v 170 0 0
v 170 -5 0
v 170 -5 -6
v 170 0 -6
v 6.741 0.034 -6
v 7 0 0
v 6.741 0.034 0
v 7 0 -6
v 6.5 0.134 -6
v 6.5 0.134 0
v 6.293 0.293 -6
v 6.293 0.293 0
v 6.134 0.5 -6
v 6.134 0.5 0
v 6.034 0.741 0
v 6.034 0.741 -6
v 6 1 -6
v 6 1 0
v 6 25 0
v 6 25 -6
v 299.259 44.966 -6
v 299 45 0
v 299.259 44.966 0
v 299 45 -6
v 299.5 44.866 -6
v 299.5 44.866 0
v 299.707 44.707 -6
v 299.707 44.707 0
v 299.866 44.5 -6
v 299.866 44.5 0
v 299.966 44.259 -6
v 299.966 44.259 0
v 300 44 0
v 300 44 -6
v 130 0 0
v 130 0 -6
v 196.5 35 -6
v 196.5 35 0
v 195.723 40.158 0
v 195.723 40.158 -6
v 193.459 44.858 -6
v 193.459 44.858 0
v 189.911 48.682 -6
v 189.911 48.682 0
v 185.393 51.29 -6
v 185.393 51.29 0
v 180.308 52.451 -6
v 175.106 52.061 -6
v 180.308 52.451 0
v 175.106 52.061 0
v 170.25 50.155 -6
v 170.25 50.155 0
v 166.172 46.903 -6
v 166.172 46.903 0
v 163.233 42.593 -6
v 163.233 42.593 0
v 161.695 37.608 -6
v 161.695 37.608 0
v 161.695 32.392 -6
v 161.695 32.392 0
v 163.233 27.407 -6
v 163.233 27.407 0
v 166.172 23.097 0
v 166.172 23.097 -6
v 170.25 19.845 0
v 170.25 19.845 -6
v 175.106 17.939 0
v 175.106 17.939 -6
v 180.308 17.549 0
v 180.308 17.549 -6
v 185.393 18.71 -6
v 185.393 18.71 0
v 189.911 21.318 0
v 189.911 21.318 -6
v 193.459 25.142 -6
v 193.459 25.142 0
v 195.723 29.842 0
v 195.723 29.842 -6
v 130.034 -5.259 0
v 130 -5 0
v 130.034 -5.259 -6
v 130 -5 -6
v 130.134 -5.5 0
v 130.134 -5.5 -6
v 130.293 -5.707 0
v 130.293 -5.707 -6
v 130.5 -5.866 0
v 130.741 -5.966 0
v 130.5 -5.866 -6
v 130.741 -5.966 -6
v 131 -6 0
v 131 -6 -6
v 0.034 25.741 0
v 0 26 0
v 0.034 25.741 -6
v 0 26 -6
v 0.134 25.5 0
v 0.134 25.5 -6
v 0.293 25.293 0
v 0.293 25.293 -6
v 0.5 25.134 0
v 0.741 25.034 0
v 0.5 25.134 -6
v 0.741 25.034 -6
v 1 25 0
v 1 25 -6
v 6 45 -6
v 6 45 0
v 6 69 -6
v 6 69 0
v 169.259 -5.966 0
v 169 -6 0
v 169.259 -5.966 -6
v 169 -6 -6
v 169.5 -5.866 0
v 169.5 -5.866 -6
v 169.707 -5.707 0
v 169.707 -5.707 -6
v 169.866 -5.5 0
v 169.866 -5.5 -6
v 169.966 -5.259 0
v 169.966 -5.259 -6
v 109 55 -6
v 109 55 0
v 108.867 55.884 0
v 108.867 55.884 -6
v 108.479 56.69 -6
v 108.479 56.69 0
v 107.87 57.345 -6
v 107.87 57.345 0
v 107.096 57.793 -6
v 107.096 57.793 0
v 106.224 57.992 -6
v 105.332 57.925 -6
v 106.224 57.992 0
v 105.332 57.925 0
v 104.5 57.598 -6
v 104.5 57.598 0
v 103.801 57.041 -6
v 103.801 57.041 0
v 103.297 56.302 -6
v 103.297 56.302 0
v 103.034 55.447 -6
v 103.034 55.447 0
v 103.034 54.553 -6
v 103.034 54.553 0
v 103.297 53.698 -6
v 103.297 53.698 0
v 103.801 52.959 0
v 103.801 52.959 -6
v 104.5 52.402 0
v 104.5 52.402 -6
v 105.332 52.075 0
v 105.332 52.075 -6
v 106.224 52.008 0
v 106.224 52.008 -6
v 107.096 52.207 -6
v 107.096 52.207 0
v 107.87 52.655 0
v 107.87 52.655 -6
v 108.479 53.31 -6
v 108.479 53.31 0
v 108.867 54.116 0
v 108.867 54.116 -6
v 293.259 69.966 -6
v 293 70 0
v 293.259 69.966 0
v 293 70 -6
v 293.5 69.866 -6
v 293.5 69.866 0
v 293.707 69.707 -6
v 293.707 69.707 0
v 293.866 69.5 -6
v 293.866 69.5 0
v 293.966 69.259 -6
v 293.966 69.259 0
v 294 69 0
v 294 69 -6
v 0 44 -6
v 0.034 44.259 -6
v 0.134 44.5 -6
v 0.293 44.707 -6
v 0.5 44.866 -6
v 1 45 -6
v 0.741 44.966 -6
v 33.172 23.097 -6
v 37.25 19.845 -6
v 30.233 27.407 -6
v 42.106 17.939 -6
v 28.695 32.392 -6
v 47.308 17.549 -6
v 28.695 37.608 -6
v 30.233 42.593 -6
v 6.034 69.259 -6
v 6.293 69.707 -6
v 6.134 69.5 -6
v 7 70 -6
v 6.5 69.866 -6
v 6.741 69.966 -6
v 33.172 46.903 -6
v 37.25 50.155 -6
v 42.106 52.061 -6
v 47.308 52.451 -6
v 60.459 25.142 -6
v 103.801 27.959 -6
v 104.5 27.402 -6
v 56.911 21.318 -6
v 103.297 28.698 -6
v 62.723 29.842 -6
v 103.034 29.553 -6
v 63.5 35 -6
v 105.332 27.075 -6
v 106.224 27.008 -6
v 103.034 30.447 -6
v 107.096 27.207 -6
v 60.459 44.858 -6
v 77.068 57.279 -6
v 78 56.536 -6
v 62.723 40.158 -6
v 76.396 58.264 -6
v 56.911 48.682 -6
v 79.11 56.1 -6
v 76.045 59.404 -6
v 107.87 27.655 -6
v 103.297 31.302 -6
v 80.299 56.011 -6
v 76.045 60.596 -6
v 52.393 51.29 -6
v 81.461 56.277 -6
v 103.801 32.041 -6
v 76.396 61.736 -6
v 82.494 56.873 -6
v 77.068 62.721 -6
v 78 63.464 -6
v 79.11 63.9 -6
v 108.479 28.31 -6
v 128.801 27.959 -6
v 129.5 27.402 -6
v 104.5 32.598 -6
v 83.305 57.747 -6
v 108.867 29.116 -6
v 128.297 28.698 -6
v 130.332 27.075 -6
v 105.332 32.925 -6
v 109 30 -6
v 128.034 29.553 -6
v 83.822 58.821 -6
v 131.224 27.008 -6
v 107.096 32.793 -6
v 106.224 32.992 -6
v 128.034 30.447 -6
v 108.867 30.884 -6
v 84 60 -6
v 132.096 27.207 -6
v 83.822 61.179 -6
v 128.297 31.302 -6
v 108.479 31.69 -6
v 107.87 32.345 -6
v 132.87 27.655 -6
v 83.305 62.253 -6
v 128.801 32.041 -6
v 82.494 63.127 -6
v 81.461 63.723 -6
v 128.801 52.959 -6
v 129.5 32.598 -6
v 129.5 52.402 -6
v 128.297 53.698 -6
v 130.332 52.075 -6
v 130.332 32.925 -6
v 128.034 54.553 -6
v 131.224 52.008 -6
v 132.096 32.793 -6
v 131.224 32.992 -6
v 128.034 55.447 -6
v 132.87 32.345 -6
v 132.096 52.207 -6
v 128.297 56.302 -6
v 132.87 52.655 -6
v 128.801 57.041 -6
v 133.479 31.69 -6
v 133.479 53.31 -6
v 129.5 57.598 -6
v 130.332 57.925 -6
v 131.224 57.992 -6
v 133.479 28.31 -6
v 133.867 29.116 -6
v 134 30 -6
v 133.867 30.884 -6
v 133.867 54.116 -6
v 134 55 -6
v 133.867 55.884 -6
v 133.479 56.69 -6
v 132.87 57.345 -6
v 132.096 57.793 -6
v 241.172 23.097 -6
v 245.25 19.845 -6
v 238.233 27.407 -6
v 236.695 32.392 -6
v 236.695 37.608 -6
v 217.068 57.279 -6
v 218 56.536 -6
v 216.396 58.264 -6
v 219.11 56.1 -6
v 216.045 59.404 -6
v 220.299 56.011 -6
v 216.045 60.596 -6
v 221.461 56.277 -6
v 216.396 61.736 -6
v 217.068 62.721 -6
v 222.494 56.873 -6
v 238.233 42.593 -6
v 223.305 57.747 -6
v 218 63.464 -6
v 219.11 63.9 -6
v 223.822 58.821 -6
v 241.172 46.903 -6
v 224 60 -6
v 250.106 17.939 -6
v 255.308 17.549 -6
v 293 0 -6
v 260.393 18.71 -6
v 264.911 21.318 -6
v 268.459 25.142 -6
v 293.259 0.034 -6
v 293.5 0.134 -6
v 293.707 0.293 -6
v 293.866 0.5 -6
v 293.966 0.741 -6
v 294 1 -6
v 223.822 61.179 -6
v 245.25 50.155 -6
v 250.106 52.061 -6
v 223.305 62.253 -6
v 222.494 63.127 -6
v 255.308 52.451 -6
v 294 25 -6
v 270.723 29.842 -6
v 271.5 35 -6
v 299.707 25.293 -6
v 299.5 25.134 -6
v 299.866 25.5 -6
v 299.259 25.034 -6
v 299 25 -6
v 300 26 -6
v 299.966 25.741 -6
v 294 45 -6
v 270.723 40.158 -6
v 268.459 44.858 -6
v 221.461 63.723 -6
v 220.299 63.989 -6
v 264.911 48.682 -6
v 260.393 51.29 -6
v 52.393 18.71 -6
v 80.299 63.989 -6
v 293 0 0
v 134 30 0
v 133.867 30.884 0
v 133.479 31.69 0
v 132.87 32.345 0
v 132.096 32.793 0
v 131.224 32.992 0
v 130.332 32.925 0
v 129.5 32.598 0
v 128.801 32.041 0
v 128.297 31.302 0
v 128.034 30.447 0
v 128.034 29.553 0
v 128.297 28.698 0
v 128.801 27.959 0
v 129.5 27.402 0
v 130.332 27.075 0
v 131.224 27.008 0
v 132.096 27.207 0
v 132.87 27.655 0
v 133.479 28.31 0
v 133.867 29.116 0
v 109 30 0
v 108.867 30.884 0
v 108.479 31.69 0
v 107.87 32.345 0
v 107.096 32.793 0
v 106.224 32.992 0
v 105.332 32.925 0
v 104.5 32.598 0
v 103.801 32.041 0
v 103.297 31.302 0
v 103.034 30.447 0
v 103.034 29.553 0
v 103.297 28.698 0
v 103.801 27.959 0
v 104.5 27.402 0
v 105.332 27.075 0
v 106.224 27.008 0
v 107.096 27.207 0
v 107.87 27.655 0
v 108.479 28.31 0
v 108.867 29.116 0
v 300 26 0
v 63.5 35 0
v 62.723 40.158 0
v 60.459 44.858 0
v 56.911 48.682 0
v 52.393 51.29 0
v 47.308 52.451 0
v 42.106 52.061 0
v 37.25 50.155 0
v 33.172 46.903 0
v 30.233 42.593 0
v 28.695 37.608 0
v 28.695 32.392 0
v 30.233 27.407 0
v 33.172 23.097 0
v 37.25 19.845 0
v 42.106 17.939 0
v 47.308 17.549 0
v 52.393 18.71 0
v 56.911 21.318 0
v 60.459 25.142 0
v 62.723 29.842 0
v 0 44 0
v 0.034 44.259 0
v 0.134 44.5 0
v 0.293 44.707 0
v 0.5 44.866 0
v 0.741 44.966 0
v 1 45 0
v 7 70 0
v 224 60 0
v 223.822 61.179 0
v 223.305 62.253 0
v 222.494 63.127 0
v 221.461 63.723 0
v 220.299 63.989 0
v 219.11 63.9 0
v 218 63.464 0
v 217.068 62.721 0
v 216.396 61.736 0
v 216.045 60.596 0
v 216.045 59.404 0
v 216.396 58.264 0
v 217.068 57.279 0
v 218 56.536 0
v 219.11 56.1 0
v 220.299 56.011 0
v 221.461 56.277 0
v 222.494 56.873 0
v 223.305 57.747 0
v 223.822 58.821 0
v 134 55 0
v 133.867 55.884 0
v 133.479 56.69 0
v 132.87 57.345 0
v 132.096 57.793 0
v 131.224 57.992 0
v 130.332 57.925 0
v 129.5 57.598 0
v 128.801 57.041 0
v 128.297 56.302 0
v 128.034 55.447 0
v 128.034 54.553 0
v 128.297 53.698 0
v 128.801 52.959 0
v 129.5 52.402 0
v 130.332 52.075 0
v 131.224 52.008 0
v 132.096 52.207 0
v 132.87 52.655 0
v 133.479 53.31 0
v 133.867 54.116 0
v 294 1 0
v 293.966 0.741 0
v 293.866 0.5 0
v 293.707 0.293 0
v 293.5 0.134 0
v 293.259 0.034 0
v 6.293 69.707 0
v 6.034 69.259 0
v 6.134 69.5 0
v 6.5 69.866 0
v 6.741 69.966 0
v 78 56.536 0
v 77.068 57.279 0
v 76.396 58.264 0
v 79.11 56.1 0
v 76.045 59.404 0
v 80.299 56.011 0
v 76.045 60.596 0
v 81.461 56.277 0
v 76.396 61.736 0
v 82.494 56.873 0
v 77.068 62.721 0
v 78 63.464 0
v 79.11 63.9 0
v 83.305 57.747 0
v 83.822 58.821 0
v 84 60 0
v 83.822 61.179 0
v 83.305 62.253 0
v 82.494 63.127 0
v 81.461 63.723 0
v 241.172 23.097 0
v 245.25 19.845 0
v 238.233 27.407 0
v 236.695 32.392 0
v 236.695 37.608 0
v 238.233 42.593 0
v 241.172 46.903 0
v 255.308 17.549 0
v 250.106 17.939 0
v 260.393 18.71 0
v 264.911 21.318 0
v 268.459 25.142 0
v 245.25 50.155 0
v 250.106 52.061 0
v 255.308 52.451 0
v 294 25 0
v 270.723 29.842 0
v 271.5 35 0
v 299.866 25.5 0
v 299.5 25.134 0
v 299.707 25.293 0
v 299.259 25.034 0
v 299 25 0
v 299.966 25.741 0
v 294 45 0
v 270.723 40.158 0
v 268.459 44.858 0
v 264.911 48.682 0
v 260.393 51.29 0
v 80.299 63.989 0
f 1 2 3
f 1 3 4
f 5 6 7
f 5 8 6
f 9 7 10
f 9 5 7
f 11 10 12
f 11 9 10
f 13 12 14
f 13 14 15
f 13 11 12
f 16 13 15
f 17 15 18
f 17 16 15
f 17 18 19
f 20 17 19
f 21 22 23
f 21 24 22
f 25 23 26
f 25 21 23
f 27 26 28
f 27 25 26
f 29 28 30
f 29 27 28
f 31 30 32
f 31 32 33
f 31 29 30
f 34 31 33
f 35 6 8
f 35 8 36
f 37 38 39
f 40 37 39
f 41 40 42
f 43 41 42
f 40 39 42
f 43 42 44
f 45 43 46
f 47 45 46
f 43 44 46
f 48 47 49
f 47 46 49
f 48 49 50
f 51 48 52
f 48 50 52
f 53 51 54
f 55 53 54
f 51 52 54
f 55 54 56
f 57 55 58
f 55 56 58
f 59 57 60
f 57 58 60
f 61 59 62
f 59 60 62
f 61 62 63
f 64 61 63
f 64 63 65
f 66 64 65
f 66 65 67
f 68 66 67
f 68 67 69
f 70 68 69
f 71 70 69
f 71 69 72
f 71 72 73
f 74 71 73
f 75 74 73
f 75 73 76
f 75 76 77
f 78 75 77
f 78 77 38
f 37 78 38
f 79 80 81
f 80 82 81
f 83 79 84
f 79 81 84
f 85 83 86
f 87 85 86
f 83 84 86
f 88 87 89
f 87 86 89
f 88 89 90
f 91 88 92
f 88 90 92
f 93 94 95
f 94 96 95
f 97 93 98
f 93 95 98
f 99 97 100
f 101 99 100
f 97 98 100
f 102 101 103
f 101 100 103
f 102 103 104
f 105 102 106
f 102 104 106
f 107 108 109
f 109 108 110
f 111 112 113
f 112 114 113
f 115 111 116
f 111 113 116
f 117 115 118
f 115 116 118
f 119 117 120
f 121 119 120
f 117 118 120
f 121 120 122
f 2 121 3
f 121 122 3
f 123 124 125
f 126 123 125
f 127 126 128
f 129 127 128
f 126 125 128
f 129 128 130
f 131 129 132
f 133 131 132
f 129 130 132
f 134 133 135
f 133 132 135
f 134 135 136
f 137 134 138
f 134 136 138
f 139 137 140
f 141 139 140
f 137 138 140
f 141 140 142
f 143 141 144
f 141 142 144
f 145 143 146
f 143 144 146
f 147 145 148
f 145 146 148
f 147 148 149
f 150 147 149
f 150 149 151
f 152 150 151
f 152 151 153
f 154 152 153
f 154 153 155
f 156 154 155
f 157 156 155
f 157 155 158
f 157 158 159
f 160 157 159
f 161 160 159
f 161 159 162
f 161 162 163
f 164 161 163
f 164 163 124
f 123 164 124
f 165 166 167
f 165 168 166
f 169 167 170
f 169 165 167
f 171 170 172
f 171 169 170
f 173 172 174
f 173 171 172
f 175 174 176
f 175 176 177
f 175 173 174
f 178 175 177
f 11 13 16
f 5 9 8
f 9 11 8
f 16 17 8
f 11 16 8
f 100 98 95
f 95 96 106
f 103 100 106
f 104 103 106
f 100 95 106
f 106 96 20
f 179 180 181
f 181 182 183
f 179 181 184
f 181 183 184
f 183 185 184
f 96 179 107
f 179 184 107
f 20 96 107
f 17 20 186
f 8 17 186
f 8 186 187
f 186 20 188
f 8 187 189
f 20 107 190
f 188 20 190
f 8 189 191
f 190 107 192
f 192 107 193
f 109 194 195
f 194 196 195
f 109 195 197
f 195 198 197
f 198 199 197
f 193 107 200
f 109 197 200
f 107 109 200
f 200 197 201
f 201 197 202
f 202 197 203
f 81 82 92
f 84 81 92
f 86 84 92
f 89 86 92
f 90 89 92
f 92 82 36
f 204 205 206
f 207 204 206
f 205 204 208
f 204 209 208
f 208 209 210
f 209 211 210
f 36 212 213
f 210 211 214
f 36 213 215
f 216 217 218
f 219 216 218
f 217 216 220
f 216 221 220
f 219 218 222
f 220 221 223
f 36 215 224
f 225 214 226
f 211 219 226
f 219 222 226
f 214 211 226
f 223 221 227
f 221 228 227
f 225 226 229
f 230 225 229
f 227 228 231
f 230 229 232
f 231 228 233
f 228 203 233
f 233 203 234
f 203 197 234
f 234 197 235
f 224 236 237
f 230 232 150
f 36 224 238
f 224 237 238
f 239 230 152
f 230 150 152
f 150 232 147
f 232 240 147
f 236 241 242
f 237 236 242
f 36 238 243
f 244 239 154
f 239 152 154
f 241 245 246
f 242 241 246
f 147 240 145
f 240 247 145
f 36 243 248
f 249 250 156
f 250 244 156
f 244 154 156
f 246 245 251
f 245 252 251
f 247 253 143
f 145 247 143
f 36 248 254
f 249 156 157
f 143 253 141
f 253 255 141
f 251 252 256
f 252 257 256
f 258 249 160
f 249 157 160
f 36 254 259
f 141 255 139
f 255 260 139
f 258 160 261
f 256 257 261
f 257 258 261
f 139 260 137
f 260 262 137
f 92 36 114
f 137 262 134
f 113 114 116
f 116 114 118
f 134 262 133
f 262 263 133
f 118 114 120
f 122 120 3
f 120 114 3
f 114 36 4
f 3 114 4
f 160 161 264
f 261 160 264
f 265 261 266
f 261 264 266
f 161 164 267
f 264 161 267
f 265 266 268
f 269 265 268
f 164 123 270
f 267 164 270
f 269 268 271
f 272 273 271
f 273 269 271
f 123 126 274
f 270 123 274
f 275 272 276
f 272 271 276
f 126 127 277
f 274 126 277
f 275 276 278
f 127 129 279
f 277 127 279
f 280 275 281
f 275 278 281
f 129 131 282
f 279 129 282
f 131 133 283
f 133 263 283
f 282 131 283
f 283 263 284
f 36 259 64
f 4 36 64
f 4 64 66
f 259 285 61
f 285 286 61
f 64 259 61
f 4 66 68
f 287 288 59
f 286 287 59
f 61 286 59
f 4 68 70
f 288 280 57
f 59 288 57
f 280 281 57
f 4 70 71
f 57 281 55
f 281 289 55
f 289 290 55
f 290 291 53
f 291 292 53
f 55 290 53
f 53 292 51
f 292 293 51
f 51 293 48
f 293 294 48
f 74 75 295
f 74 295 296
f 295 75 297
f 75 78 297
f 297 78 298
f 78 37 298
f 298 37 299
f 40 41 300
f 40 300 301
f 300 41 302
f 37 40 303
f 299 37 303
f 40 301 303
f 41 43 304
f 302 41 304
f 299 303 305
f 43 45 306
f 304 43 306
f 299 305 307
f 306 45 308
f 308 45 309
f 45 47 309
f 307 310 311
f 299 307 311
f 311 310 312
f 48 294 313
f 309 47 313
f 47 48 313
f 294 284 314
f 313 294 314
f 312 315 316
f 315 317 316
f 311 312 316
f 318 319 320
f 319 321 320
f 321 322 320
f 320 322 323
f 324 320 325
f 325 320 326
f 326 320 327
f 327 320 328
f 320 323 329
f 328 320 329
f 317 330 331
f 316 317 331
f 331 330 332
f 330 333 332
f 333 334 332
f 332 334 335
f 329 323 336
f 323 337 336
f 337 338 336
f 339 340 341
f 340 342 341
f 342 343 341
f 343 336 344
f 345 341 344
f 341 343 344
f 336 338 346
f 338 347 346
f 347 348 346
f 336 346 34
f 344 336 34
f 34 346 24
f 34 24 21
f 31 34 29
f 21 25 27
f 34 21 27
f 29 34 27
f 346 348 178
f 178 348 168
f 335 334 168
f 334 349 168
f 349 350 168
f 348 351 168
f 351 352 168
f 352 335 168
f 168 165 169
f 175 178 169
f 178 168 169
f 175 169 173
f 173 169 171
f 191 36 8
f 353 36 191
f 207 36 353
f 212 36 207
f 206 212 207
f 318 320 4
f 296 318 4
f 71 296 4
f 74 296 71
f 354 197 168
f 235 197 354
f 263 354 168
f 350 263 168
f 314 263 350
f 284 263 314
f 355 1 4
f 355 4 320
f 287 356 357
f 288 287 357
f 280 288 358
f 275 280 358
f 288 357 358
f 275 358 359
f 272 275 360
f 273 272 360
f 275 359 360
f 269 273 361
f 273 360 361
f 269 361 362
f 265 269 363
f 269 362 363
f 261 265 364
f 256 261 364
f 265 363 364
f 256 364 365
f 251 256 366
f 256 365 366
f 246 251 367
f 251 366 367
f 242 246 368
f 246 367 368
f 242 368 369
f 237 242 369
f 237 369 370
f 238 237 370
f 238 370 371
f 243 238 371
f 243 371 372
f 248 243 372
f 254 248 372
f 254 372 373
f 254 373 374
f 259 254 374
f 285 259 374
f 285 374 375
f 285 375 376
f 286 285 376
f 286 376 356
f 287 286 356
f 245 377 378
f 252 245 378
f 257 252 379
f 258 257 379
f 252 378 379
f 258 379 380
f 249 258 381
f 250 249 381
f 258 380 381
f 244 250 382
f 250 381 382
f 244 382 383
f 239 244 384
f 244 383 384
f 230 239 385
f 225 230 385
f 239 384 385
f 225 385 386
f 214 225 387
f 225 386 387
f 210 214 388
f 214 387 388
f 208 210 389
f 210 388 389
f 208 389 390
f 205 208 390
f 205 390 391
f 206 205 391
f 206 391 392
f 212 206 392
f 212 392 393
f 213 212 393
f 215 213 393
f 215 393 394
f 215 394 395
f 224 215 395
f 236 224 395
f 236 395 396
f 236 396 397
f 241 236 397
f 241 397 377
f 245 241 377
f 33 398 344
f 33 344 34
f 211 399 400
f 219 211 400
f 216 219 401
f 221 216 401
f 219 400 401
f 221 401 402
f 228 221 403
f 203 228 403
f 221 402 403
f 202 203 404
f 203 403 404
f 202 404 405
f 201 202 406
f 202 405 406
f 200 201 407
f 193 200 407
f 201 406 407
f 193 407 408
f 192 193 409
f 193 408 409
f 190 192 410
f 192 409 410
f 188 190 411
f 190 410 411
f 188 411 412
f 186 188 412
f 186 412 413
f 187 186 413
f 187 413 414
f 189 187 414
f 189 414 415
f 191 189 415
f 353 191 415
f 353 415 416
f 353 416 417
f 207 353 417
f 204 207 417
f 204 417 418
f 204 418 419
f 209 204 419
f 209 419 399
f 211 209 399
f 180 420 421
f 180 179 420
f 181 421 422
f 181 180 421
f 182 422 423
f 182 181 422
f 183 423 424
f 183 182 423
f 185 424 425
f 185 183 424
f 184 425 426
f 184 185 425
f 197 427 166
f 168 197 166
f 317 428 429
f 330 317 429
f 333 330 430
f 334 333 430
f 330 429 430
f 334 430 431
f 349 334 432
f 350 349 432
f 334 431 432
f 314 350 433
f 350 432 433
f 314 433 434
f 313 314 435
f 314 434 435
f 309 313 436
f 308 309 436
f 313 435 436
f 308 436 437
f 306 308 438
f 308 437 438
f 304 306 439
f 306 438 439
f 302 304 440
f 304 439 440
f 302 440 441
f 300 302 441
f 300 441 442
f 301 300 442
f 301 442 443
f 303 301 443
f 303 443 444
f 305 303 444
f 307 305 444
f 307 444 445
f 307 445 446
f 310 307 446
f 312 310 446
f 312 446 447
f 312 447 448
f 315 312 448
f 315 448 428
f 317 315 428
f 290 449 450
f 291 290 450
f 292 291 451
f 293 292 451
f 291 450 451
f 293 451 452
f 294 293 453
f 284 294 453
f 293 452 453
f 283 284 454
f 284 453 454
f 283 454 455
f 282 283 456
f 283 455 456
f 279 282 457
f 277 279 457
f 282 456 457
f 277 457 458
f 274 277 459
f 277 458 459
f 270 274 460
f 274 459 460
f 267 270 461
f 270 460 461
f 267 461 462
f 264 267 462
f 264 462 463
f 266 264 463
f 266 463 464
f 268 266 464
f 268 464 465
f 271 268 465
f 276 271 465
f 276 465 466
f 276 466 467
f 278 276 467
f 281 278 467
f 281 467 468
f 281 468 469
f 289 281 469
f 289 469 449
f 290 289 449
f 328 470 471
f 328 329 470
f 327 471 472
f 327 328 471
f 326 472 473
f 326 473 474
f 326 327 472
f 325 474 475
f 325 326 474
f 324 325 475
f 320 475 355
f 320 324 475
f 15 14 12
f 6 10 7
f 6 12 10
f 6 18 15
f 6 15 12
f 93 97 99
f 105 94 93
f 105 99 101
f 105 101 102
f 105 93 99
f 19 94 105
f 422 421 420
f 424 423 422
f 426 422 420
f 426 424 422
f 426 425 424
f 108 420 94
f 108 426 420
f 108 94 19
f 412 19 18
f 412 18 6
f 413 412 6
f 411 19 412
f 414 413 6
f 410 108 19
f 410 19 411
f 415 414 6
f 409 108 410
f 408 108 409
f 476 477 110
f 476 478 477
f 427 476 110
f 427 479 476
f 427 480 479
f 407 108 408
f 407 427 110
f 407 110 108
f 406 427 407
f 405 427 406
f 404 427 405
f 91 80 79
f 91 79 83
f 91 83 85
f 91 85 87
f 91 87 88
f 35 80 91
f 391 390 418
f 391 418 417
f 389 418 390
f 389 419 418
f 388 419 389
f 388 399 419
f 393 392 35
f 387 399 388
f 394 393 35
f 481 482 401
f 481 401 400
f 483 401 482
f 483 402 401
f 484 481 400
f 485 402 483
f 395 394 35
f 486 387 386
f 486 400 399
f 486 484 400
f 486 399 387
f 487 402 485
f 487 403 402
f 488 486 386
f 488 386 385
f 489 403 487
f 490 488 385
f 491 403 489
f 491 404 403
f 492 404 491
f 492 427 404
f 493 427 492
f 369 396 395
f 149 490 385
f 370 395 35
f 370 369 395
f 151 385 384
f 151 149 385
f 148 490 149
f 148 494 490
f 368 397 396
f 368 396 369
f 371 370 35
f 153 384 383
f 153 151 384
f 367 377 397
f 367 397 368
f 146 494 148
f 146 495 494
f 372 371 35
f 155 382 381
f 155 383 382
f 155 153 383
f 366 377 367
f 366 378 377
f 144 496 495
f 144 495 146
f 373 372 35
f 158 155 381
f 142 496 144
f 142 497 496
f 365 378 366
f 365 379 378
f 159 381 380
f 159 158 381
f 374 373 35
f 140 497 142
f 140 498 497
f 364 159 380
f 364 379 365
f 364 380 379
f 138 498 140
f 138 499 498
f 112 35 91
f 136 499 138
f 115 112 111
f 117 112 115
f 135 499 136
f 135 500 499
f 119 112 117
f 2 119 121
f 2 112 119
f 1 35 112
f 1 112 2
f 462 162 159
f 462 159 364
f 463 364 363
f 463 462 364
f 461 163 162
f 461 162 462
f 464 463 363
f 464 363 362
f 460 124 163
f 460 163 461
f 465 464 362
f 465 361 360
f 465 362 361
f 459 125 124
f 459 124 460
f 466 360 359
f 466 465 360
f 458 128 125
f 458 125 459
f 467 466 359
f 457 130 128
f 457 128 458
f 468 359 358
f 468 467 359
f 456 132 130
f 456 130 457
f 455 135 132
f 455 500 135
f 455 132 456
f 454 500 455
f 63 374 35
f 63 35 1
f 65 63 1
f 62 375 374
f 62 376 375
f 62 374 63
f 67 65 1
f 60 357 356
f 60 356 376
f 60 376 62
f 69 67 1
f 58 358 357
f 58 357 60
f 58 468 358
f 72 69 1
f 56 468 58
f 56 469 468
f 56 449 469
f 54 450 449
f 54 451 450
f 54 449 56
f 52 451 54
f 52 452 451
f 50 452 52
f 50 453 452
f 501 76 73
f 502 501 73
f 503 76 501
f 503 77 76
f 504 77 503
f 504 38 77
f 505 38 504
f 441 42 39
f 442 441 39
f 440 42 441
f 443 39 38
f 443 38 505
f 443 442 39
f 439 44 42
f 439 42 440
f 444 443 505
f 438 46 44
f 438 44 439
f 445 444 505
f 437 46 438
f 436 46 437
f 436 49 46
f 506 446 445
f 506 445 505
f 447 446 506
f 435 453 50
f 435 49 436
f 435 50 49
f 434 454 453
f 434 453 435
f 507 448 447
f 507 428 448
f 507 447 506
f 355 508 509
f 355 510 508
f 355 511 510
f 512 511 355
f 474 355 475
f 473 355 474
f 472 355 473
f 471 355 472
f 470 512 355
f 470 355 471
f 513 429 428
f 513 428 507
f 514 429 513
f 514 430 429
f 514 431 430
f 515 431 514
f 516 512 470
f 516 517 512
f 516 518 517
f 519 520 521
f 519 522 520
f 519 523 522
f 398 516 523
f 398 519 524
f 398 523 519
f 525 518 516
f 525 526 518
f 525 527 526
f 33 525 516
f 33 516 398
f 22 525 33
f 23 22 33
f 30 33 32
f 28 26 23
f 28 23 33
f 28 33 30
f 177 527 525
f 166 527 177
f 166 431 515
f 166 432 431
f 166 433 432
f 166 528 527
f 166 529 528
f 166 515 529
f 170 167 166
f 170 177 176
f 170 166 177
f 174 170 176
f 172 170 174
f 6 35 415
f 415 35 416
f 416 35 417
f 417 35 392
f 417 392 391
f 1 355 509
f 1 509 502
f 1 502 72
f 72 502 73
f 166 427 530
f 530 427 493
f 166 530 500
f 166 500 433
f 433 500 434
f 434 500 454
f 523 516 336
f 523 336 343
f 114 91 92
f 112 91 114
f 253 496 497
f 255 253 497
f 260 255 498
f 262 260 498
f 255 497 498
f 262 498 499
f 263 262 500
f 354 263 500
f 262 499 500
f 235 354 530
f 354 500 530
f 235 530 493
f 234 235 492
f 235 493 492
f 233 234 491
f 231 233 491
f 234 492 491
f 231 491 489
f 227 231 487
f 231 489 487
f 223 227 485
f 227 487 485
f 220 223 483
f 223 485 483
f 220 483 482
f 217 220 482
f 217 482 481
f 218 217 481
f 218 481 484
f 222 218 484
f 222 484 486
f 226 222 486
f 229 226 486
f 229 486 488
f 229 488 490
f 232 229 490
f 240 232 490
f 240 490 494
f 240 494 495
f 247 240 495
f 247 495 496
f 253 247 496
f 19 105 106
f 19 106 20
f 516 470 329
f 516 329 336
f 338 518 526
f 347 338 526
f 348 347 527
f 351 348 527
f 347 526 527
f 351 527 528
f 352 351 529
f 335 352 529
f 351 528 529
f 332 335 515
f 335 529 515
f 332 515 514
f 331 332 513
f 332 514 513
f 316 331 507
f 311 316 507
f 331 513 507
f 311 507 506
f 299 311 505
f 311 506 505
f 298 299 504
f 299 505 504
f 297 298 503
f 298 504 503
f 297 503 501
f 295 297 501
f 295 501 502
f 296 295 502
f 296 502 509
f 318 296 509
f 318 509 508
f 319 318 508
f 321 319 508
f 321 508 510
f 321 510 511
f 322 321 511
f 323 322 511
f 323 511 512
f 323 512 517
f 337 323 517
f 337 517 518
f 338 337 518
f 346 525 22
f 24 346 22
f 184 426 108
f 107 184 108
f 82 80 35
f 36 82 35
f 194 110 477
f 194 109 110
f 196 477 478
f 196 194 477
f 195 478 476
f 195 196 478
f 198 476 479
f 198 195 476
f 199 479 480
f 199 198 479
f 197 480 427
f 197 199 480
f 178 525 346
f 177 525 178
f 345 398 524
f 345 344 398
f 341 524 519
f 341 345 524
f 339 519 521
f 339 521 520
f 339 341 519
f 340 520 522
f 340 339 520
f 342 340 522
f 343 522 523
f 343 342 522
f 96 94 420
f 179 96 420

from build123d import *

# Parameters (mm, degrees)
SKETCH1_W           = 300
SKETCH1_H           = 70
FRONT_DEPTH         = 6
SKETCH2_W           = 6
SKETCH2_H           = 25
SKETCH2_R           = 4
MOUNT_DEPTH         = 309.116860947
SKETCH3_W           = 40
SKETCH3_H           = 6
BOSS_EXTRUDE1_DEPTH = 6
FILLET_2_R          = 1
SKETCH4_R           = 3
CUT_EXTRUDE1_DEPTH  = 309.116860947
LITE_REACH          = 310.117
SKETCH5_R           = 17.5


with BuildPart() as part:
    # Sketch1 → front (new body)
    with BuildSketch(Plane.XY):
        with Locations((150, 35)):
            Rectangle(SKETCH1_W, SKETCH1_H)
    extrude(amount=-FRONT_DEPTH)

    # Sketch2 → mount (cut, through all)
    with BuildSketch(Plane.XY):
        with Locations((3, 57.5)):
            Rectangle(SKETCH2_W, SKETCH2_H)
        with Locations((3, 12.5)):
            Rectangle(SKETCH2_W, SKETCH2_H)
        with Locations((297, 57.5)):
            Rectangle(SKETCH2_W, SKETCH2_H)
        with Locations((297, 12.5)):
            Rectangle(SKETCH2_W, SKETCH2_H)
        with Locations((80, 60)):
            Circle(SKETCH2_R)
        with Locations((220, 60)):
            Circle(SKETCH2_R)
    extrude(amount=-MOUNT_DEPTH, mode=Mode.SUBTRACT)

    # Sketch3 → Boss-Extrude1 (add)
    with BuildSketch(Plane.XY):
        with Locations((150, -3)):
            Rectangle(SKETCH3_W, SKETCH3_H)
    extrude(amount=-BOSS_EXTRUDE1_DEPTH)

    # fillet 2
    fillet_2_edges = [part.edges().sort_by_distance(p)[0] for p in [
        (0, 45, -3),
        (0, 25, -3),
        (294, 0, -3),
        (300, 25, -3),
        (300, 45, -3),
        (294, 70, -3),
        (6, 0, -3),
        (6, 70, -3),
        (170, -6, -3),
        (130, -6, -3),
    ]]
    fillet(fillet_2_edges, radius=FILLET_2_R)

    # Sketch4 → Cut-Extrude1 (cut, through all)
    with BuildSketch(Plane.XY):
        with Locations((106, 55)):
            Circle(SKETCH4_R)
        with Locations((131, 55)):
            Circle(SKETCH4_R)
        with Locations((106, 30)):
            Circle(SKETCH4_R)
        with Locations((131, 30)):
            Circle(SKETCH4_R)
    extrude(amount=-CUT_EXTRUDE1_DEPTH, mode=Mode.SUBTRACT)

    # Sketch5 → lite (cut, up to next)
    with BuildSketch(Plane.XY, mode=Mode.PRIVATE) as lite_sk1:
        with Locations((46, 35)):
            Circle(SKETCH5_R)
    lite_tool1 = extrude(lite_sk1.sketch, amount=-LITE_REACH, mode=Mode.PRIVATE) & part.part
    # Sketch5 → lite (cut, up to next)
    with BuildSketch(Plane.XY, mode=Mode.PRIVATE) as lite_sk2:
        with Locations((179, 35)):
            Circle(SKETCH5_R)
    lite_tool2 = extrude(lite_sk2.sketch, amount=-LITE_REACH, mode=Mode.PRIVATE) & part.part
    # Sketch5 → lite (cut, up to next)
    with BuildSketch(Plane.XY, mode=Mode.PRIVATE) as lite_sk3:
        with Locations((254, 35)):
            Circle(SKETCH5_R)
    lite_tool3 = extrude(lite_sk3.sketch, amount=-LITE_REACH, mode=Mode.PRIVATE) & part.part
    add(lite_tool1.solids().sort_by_distance((46, 35, 0))[0], mode=Mode.SUBTRACT)
    add(lite_tool2.solids().sort_by_distance((179, 35, 0))[0], mode=Mode.SUBTRACT)
    add(lite_tool3.solids().sort_by_distance((254, 35, 0))[0], mode=Mode.SUBTRACT)


solid = part.part
